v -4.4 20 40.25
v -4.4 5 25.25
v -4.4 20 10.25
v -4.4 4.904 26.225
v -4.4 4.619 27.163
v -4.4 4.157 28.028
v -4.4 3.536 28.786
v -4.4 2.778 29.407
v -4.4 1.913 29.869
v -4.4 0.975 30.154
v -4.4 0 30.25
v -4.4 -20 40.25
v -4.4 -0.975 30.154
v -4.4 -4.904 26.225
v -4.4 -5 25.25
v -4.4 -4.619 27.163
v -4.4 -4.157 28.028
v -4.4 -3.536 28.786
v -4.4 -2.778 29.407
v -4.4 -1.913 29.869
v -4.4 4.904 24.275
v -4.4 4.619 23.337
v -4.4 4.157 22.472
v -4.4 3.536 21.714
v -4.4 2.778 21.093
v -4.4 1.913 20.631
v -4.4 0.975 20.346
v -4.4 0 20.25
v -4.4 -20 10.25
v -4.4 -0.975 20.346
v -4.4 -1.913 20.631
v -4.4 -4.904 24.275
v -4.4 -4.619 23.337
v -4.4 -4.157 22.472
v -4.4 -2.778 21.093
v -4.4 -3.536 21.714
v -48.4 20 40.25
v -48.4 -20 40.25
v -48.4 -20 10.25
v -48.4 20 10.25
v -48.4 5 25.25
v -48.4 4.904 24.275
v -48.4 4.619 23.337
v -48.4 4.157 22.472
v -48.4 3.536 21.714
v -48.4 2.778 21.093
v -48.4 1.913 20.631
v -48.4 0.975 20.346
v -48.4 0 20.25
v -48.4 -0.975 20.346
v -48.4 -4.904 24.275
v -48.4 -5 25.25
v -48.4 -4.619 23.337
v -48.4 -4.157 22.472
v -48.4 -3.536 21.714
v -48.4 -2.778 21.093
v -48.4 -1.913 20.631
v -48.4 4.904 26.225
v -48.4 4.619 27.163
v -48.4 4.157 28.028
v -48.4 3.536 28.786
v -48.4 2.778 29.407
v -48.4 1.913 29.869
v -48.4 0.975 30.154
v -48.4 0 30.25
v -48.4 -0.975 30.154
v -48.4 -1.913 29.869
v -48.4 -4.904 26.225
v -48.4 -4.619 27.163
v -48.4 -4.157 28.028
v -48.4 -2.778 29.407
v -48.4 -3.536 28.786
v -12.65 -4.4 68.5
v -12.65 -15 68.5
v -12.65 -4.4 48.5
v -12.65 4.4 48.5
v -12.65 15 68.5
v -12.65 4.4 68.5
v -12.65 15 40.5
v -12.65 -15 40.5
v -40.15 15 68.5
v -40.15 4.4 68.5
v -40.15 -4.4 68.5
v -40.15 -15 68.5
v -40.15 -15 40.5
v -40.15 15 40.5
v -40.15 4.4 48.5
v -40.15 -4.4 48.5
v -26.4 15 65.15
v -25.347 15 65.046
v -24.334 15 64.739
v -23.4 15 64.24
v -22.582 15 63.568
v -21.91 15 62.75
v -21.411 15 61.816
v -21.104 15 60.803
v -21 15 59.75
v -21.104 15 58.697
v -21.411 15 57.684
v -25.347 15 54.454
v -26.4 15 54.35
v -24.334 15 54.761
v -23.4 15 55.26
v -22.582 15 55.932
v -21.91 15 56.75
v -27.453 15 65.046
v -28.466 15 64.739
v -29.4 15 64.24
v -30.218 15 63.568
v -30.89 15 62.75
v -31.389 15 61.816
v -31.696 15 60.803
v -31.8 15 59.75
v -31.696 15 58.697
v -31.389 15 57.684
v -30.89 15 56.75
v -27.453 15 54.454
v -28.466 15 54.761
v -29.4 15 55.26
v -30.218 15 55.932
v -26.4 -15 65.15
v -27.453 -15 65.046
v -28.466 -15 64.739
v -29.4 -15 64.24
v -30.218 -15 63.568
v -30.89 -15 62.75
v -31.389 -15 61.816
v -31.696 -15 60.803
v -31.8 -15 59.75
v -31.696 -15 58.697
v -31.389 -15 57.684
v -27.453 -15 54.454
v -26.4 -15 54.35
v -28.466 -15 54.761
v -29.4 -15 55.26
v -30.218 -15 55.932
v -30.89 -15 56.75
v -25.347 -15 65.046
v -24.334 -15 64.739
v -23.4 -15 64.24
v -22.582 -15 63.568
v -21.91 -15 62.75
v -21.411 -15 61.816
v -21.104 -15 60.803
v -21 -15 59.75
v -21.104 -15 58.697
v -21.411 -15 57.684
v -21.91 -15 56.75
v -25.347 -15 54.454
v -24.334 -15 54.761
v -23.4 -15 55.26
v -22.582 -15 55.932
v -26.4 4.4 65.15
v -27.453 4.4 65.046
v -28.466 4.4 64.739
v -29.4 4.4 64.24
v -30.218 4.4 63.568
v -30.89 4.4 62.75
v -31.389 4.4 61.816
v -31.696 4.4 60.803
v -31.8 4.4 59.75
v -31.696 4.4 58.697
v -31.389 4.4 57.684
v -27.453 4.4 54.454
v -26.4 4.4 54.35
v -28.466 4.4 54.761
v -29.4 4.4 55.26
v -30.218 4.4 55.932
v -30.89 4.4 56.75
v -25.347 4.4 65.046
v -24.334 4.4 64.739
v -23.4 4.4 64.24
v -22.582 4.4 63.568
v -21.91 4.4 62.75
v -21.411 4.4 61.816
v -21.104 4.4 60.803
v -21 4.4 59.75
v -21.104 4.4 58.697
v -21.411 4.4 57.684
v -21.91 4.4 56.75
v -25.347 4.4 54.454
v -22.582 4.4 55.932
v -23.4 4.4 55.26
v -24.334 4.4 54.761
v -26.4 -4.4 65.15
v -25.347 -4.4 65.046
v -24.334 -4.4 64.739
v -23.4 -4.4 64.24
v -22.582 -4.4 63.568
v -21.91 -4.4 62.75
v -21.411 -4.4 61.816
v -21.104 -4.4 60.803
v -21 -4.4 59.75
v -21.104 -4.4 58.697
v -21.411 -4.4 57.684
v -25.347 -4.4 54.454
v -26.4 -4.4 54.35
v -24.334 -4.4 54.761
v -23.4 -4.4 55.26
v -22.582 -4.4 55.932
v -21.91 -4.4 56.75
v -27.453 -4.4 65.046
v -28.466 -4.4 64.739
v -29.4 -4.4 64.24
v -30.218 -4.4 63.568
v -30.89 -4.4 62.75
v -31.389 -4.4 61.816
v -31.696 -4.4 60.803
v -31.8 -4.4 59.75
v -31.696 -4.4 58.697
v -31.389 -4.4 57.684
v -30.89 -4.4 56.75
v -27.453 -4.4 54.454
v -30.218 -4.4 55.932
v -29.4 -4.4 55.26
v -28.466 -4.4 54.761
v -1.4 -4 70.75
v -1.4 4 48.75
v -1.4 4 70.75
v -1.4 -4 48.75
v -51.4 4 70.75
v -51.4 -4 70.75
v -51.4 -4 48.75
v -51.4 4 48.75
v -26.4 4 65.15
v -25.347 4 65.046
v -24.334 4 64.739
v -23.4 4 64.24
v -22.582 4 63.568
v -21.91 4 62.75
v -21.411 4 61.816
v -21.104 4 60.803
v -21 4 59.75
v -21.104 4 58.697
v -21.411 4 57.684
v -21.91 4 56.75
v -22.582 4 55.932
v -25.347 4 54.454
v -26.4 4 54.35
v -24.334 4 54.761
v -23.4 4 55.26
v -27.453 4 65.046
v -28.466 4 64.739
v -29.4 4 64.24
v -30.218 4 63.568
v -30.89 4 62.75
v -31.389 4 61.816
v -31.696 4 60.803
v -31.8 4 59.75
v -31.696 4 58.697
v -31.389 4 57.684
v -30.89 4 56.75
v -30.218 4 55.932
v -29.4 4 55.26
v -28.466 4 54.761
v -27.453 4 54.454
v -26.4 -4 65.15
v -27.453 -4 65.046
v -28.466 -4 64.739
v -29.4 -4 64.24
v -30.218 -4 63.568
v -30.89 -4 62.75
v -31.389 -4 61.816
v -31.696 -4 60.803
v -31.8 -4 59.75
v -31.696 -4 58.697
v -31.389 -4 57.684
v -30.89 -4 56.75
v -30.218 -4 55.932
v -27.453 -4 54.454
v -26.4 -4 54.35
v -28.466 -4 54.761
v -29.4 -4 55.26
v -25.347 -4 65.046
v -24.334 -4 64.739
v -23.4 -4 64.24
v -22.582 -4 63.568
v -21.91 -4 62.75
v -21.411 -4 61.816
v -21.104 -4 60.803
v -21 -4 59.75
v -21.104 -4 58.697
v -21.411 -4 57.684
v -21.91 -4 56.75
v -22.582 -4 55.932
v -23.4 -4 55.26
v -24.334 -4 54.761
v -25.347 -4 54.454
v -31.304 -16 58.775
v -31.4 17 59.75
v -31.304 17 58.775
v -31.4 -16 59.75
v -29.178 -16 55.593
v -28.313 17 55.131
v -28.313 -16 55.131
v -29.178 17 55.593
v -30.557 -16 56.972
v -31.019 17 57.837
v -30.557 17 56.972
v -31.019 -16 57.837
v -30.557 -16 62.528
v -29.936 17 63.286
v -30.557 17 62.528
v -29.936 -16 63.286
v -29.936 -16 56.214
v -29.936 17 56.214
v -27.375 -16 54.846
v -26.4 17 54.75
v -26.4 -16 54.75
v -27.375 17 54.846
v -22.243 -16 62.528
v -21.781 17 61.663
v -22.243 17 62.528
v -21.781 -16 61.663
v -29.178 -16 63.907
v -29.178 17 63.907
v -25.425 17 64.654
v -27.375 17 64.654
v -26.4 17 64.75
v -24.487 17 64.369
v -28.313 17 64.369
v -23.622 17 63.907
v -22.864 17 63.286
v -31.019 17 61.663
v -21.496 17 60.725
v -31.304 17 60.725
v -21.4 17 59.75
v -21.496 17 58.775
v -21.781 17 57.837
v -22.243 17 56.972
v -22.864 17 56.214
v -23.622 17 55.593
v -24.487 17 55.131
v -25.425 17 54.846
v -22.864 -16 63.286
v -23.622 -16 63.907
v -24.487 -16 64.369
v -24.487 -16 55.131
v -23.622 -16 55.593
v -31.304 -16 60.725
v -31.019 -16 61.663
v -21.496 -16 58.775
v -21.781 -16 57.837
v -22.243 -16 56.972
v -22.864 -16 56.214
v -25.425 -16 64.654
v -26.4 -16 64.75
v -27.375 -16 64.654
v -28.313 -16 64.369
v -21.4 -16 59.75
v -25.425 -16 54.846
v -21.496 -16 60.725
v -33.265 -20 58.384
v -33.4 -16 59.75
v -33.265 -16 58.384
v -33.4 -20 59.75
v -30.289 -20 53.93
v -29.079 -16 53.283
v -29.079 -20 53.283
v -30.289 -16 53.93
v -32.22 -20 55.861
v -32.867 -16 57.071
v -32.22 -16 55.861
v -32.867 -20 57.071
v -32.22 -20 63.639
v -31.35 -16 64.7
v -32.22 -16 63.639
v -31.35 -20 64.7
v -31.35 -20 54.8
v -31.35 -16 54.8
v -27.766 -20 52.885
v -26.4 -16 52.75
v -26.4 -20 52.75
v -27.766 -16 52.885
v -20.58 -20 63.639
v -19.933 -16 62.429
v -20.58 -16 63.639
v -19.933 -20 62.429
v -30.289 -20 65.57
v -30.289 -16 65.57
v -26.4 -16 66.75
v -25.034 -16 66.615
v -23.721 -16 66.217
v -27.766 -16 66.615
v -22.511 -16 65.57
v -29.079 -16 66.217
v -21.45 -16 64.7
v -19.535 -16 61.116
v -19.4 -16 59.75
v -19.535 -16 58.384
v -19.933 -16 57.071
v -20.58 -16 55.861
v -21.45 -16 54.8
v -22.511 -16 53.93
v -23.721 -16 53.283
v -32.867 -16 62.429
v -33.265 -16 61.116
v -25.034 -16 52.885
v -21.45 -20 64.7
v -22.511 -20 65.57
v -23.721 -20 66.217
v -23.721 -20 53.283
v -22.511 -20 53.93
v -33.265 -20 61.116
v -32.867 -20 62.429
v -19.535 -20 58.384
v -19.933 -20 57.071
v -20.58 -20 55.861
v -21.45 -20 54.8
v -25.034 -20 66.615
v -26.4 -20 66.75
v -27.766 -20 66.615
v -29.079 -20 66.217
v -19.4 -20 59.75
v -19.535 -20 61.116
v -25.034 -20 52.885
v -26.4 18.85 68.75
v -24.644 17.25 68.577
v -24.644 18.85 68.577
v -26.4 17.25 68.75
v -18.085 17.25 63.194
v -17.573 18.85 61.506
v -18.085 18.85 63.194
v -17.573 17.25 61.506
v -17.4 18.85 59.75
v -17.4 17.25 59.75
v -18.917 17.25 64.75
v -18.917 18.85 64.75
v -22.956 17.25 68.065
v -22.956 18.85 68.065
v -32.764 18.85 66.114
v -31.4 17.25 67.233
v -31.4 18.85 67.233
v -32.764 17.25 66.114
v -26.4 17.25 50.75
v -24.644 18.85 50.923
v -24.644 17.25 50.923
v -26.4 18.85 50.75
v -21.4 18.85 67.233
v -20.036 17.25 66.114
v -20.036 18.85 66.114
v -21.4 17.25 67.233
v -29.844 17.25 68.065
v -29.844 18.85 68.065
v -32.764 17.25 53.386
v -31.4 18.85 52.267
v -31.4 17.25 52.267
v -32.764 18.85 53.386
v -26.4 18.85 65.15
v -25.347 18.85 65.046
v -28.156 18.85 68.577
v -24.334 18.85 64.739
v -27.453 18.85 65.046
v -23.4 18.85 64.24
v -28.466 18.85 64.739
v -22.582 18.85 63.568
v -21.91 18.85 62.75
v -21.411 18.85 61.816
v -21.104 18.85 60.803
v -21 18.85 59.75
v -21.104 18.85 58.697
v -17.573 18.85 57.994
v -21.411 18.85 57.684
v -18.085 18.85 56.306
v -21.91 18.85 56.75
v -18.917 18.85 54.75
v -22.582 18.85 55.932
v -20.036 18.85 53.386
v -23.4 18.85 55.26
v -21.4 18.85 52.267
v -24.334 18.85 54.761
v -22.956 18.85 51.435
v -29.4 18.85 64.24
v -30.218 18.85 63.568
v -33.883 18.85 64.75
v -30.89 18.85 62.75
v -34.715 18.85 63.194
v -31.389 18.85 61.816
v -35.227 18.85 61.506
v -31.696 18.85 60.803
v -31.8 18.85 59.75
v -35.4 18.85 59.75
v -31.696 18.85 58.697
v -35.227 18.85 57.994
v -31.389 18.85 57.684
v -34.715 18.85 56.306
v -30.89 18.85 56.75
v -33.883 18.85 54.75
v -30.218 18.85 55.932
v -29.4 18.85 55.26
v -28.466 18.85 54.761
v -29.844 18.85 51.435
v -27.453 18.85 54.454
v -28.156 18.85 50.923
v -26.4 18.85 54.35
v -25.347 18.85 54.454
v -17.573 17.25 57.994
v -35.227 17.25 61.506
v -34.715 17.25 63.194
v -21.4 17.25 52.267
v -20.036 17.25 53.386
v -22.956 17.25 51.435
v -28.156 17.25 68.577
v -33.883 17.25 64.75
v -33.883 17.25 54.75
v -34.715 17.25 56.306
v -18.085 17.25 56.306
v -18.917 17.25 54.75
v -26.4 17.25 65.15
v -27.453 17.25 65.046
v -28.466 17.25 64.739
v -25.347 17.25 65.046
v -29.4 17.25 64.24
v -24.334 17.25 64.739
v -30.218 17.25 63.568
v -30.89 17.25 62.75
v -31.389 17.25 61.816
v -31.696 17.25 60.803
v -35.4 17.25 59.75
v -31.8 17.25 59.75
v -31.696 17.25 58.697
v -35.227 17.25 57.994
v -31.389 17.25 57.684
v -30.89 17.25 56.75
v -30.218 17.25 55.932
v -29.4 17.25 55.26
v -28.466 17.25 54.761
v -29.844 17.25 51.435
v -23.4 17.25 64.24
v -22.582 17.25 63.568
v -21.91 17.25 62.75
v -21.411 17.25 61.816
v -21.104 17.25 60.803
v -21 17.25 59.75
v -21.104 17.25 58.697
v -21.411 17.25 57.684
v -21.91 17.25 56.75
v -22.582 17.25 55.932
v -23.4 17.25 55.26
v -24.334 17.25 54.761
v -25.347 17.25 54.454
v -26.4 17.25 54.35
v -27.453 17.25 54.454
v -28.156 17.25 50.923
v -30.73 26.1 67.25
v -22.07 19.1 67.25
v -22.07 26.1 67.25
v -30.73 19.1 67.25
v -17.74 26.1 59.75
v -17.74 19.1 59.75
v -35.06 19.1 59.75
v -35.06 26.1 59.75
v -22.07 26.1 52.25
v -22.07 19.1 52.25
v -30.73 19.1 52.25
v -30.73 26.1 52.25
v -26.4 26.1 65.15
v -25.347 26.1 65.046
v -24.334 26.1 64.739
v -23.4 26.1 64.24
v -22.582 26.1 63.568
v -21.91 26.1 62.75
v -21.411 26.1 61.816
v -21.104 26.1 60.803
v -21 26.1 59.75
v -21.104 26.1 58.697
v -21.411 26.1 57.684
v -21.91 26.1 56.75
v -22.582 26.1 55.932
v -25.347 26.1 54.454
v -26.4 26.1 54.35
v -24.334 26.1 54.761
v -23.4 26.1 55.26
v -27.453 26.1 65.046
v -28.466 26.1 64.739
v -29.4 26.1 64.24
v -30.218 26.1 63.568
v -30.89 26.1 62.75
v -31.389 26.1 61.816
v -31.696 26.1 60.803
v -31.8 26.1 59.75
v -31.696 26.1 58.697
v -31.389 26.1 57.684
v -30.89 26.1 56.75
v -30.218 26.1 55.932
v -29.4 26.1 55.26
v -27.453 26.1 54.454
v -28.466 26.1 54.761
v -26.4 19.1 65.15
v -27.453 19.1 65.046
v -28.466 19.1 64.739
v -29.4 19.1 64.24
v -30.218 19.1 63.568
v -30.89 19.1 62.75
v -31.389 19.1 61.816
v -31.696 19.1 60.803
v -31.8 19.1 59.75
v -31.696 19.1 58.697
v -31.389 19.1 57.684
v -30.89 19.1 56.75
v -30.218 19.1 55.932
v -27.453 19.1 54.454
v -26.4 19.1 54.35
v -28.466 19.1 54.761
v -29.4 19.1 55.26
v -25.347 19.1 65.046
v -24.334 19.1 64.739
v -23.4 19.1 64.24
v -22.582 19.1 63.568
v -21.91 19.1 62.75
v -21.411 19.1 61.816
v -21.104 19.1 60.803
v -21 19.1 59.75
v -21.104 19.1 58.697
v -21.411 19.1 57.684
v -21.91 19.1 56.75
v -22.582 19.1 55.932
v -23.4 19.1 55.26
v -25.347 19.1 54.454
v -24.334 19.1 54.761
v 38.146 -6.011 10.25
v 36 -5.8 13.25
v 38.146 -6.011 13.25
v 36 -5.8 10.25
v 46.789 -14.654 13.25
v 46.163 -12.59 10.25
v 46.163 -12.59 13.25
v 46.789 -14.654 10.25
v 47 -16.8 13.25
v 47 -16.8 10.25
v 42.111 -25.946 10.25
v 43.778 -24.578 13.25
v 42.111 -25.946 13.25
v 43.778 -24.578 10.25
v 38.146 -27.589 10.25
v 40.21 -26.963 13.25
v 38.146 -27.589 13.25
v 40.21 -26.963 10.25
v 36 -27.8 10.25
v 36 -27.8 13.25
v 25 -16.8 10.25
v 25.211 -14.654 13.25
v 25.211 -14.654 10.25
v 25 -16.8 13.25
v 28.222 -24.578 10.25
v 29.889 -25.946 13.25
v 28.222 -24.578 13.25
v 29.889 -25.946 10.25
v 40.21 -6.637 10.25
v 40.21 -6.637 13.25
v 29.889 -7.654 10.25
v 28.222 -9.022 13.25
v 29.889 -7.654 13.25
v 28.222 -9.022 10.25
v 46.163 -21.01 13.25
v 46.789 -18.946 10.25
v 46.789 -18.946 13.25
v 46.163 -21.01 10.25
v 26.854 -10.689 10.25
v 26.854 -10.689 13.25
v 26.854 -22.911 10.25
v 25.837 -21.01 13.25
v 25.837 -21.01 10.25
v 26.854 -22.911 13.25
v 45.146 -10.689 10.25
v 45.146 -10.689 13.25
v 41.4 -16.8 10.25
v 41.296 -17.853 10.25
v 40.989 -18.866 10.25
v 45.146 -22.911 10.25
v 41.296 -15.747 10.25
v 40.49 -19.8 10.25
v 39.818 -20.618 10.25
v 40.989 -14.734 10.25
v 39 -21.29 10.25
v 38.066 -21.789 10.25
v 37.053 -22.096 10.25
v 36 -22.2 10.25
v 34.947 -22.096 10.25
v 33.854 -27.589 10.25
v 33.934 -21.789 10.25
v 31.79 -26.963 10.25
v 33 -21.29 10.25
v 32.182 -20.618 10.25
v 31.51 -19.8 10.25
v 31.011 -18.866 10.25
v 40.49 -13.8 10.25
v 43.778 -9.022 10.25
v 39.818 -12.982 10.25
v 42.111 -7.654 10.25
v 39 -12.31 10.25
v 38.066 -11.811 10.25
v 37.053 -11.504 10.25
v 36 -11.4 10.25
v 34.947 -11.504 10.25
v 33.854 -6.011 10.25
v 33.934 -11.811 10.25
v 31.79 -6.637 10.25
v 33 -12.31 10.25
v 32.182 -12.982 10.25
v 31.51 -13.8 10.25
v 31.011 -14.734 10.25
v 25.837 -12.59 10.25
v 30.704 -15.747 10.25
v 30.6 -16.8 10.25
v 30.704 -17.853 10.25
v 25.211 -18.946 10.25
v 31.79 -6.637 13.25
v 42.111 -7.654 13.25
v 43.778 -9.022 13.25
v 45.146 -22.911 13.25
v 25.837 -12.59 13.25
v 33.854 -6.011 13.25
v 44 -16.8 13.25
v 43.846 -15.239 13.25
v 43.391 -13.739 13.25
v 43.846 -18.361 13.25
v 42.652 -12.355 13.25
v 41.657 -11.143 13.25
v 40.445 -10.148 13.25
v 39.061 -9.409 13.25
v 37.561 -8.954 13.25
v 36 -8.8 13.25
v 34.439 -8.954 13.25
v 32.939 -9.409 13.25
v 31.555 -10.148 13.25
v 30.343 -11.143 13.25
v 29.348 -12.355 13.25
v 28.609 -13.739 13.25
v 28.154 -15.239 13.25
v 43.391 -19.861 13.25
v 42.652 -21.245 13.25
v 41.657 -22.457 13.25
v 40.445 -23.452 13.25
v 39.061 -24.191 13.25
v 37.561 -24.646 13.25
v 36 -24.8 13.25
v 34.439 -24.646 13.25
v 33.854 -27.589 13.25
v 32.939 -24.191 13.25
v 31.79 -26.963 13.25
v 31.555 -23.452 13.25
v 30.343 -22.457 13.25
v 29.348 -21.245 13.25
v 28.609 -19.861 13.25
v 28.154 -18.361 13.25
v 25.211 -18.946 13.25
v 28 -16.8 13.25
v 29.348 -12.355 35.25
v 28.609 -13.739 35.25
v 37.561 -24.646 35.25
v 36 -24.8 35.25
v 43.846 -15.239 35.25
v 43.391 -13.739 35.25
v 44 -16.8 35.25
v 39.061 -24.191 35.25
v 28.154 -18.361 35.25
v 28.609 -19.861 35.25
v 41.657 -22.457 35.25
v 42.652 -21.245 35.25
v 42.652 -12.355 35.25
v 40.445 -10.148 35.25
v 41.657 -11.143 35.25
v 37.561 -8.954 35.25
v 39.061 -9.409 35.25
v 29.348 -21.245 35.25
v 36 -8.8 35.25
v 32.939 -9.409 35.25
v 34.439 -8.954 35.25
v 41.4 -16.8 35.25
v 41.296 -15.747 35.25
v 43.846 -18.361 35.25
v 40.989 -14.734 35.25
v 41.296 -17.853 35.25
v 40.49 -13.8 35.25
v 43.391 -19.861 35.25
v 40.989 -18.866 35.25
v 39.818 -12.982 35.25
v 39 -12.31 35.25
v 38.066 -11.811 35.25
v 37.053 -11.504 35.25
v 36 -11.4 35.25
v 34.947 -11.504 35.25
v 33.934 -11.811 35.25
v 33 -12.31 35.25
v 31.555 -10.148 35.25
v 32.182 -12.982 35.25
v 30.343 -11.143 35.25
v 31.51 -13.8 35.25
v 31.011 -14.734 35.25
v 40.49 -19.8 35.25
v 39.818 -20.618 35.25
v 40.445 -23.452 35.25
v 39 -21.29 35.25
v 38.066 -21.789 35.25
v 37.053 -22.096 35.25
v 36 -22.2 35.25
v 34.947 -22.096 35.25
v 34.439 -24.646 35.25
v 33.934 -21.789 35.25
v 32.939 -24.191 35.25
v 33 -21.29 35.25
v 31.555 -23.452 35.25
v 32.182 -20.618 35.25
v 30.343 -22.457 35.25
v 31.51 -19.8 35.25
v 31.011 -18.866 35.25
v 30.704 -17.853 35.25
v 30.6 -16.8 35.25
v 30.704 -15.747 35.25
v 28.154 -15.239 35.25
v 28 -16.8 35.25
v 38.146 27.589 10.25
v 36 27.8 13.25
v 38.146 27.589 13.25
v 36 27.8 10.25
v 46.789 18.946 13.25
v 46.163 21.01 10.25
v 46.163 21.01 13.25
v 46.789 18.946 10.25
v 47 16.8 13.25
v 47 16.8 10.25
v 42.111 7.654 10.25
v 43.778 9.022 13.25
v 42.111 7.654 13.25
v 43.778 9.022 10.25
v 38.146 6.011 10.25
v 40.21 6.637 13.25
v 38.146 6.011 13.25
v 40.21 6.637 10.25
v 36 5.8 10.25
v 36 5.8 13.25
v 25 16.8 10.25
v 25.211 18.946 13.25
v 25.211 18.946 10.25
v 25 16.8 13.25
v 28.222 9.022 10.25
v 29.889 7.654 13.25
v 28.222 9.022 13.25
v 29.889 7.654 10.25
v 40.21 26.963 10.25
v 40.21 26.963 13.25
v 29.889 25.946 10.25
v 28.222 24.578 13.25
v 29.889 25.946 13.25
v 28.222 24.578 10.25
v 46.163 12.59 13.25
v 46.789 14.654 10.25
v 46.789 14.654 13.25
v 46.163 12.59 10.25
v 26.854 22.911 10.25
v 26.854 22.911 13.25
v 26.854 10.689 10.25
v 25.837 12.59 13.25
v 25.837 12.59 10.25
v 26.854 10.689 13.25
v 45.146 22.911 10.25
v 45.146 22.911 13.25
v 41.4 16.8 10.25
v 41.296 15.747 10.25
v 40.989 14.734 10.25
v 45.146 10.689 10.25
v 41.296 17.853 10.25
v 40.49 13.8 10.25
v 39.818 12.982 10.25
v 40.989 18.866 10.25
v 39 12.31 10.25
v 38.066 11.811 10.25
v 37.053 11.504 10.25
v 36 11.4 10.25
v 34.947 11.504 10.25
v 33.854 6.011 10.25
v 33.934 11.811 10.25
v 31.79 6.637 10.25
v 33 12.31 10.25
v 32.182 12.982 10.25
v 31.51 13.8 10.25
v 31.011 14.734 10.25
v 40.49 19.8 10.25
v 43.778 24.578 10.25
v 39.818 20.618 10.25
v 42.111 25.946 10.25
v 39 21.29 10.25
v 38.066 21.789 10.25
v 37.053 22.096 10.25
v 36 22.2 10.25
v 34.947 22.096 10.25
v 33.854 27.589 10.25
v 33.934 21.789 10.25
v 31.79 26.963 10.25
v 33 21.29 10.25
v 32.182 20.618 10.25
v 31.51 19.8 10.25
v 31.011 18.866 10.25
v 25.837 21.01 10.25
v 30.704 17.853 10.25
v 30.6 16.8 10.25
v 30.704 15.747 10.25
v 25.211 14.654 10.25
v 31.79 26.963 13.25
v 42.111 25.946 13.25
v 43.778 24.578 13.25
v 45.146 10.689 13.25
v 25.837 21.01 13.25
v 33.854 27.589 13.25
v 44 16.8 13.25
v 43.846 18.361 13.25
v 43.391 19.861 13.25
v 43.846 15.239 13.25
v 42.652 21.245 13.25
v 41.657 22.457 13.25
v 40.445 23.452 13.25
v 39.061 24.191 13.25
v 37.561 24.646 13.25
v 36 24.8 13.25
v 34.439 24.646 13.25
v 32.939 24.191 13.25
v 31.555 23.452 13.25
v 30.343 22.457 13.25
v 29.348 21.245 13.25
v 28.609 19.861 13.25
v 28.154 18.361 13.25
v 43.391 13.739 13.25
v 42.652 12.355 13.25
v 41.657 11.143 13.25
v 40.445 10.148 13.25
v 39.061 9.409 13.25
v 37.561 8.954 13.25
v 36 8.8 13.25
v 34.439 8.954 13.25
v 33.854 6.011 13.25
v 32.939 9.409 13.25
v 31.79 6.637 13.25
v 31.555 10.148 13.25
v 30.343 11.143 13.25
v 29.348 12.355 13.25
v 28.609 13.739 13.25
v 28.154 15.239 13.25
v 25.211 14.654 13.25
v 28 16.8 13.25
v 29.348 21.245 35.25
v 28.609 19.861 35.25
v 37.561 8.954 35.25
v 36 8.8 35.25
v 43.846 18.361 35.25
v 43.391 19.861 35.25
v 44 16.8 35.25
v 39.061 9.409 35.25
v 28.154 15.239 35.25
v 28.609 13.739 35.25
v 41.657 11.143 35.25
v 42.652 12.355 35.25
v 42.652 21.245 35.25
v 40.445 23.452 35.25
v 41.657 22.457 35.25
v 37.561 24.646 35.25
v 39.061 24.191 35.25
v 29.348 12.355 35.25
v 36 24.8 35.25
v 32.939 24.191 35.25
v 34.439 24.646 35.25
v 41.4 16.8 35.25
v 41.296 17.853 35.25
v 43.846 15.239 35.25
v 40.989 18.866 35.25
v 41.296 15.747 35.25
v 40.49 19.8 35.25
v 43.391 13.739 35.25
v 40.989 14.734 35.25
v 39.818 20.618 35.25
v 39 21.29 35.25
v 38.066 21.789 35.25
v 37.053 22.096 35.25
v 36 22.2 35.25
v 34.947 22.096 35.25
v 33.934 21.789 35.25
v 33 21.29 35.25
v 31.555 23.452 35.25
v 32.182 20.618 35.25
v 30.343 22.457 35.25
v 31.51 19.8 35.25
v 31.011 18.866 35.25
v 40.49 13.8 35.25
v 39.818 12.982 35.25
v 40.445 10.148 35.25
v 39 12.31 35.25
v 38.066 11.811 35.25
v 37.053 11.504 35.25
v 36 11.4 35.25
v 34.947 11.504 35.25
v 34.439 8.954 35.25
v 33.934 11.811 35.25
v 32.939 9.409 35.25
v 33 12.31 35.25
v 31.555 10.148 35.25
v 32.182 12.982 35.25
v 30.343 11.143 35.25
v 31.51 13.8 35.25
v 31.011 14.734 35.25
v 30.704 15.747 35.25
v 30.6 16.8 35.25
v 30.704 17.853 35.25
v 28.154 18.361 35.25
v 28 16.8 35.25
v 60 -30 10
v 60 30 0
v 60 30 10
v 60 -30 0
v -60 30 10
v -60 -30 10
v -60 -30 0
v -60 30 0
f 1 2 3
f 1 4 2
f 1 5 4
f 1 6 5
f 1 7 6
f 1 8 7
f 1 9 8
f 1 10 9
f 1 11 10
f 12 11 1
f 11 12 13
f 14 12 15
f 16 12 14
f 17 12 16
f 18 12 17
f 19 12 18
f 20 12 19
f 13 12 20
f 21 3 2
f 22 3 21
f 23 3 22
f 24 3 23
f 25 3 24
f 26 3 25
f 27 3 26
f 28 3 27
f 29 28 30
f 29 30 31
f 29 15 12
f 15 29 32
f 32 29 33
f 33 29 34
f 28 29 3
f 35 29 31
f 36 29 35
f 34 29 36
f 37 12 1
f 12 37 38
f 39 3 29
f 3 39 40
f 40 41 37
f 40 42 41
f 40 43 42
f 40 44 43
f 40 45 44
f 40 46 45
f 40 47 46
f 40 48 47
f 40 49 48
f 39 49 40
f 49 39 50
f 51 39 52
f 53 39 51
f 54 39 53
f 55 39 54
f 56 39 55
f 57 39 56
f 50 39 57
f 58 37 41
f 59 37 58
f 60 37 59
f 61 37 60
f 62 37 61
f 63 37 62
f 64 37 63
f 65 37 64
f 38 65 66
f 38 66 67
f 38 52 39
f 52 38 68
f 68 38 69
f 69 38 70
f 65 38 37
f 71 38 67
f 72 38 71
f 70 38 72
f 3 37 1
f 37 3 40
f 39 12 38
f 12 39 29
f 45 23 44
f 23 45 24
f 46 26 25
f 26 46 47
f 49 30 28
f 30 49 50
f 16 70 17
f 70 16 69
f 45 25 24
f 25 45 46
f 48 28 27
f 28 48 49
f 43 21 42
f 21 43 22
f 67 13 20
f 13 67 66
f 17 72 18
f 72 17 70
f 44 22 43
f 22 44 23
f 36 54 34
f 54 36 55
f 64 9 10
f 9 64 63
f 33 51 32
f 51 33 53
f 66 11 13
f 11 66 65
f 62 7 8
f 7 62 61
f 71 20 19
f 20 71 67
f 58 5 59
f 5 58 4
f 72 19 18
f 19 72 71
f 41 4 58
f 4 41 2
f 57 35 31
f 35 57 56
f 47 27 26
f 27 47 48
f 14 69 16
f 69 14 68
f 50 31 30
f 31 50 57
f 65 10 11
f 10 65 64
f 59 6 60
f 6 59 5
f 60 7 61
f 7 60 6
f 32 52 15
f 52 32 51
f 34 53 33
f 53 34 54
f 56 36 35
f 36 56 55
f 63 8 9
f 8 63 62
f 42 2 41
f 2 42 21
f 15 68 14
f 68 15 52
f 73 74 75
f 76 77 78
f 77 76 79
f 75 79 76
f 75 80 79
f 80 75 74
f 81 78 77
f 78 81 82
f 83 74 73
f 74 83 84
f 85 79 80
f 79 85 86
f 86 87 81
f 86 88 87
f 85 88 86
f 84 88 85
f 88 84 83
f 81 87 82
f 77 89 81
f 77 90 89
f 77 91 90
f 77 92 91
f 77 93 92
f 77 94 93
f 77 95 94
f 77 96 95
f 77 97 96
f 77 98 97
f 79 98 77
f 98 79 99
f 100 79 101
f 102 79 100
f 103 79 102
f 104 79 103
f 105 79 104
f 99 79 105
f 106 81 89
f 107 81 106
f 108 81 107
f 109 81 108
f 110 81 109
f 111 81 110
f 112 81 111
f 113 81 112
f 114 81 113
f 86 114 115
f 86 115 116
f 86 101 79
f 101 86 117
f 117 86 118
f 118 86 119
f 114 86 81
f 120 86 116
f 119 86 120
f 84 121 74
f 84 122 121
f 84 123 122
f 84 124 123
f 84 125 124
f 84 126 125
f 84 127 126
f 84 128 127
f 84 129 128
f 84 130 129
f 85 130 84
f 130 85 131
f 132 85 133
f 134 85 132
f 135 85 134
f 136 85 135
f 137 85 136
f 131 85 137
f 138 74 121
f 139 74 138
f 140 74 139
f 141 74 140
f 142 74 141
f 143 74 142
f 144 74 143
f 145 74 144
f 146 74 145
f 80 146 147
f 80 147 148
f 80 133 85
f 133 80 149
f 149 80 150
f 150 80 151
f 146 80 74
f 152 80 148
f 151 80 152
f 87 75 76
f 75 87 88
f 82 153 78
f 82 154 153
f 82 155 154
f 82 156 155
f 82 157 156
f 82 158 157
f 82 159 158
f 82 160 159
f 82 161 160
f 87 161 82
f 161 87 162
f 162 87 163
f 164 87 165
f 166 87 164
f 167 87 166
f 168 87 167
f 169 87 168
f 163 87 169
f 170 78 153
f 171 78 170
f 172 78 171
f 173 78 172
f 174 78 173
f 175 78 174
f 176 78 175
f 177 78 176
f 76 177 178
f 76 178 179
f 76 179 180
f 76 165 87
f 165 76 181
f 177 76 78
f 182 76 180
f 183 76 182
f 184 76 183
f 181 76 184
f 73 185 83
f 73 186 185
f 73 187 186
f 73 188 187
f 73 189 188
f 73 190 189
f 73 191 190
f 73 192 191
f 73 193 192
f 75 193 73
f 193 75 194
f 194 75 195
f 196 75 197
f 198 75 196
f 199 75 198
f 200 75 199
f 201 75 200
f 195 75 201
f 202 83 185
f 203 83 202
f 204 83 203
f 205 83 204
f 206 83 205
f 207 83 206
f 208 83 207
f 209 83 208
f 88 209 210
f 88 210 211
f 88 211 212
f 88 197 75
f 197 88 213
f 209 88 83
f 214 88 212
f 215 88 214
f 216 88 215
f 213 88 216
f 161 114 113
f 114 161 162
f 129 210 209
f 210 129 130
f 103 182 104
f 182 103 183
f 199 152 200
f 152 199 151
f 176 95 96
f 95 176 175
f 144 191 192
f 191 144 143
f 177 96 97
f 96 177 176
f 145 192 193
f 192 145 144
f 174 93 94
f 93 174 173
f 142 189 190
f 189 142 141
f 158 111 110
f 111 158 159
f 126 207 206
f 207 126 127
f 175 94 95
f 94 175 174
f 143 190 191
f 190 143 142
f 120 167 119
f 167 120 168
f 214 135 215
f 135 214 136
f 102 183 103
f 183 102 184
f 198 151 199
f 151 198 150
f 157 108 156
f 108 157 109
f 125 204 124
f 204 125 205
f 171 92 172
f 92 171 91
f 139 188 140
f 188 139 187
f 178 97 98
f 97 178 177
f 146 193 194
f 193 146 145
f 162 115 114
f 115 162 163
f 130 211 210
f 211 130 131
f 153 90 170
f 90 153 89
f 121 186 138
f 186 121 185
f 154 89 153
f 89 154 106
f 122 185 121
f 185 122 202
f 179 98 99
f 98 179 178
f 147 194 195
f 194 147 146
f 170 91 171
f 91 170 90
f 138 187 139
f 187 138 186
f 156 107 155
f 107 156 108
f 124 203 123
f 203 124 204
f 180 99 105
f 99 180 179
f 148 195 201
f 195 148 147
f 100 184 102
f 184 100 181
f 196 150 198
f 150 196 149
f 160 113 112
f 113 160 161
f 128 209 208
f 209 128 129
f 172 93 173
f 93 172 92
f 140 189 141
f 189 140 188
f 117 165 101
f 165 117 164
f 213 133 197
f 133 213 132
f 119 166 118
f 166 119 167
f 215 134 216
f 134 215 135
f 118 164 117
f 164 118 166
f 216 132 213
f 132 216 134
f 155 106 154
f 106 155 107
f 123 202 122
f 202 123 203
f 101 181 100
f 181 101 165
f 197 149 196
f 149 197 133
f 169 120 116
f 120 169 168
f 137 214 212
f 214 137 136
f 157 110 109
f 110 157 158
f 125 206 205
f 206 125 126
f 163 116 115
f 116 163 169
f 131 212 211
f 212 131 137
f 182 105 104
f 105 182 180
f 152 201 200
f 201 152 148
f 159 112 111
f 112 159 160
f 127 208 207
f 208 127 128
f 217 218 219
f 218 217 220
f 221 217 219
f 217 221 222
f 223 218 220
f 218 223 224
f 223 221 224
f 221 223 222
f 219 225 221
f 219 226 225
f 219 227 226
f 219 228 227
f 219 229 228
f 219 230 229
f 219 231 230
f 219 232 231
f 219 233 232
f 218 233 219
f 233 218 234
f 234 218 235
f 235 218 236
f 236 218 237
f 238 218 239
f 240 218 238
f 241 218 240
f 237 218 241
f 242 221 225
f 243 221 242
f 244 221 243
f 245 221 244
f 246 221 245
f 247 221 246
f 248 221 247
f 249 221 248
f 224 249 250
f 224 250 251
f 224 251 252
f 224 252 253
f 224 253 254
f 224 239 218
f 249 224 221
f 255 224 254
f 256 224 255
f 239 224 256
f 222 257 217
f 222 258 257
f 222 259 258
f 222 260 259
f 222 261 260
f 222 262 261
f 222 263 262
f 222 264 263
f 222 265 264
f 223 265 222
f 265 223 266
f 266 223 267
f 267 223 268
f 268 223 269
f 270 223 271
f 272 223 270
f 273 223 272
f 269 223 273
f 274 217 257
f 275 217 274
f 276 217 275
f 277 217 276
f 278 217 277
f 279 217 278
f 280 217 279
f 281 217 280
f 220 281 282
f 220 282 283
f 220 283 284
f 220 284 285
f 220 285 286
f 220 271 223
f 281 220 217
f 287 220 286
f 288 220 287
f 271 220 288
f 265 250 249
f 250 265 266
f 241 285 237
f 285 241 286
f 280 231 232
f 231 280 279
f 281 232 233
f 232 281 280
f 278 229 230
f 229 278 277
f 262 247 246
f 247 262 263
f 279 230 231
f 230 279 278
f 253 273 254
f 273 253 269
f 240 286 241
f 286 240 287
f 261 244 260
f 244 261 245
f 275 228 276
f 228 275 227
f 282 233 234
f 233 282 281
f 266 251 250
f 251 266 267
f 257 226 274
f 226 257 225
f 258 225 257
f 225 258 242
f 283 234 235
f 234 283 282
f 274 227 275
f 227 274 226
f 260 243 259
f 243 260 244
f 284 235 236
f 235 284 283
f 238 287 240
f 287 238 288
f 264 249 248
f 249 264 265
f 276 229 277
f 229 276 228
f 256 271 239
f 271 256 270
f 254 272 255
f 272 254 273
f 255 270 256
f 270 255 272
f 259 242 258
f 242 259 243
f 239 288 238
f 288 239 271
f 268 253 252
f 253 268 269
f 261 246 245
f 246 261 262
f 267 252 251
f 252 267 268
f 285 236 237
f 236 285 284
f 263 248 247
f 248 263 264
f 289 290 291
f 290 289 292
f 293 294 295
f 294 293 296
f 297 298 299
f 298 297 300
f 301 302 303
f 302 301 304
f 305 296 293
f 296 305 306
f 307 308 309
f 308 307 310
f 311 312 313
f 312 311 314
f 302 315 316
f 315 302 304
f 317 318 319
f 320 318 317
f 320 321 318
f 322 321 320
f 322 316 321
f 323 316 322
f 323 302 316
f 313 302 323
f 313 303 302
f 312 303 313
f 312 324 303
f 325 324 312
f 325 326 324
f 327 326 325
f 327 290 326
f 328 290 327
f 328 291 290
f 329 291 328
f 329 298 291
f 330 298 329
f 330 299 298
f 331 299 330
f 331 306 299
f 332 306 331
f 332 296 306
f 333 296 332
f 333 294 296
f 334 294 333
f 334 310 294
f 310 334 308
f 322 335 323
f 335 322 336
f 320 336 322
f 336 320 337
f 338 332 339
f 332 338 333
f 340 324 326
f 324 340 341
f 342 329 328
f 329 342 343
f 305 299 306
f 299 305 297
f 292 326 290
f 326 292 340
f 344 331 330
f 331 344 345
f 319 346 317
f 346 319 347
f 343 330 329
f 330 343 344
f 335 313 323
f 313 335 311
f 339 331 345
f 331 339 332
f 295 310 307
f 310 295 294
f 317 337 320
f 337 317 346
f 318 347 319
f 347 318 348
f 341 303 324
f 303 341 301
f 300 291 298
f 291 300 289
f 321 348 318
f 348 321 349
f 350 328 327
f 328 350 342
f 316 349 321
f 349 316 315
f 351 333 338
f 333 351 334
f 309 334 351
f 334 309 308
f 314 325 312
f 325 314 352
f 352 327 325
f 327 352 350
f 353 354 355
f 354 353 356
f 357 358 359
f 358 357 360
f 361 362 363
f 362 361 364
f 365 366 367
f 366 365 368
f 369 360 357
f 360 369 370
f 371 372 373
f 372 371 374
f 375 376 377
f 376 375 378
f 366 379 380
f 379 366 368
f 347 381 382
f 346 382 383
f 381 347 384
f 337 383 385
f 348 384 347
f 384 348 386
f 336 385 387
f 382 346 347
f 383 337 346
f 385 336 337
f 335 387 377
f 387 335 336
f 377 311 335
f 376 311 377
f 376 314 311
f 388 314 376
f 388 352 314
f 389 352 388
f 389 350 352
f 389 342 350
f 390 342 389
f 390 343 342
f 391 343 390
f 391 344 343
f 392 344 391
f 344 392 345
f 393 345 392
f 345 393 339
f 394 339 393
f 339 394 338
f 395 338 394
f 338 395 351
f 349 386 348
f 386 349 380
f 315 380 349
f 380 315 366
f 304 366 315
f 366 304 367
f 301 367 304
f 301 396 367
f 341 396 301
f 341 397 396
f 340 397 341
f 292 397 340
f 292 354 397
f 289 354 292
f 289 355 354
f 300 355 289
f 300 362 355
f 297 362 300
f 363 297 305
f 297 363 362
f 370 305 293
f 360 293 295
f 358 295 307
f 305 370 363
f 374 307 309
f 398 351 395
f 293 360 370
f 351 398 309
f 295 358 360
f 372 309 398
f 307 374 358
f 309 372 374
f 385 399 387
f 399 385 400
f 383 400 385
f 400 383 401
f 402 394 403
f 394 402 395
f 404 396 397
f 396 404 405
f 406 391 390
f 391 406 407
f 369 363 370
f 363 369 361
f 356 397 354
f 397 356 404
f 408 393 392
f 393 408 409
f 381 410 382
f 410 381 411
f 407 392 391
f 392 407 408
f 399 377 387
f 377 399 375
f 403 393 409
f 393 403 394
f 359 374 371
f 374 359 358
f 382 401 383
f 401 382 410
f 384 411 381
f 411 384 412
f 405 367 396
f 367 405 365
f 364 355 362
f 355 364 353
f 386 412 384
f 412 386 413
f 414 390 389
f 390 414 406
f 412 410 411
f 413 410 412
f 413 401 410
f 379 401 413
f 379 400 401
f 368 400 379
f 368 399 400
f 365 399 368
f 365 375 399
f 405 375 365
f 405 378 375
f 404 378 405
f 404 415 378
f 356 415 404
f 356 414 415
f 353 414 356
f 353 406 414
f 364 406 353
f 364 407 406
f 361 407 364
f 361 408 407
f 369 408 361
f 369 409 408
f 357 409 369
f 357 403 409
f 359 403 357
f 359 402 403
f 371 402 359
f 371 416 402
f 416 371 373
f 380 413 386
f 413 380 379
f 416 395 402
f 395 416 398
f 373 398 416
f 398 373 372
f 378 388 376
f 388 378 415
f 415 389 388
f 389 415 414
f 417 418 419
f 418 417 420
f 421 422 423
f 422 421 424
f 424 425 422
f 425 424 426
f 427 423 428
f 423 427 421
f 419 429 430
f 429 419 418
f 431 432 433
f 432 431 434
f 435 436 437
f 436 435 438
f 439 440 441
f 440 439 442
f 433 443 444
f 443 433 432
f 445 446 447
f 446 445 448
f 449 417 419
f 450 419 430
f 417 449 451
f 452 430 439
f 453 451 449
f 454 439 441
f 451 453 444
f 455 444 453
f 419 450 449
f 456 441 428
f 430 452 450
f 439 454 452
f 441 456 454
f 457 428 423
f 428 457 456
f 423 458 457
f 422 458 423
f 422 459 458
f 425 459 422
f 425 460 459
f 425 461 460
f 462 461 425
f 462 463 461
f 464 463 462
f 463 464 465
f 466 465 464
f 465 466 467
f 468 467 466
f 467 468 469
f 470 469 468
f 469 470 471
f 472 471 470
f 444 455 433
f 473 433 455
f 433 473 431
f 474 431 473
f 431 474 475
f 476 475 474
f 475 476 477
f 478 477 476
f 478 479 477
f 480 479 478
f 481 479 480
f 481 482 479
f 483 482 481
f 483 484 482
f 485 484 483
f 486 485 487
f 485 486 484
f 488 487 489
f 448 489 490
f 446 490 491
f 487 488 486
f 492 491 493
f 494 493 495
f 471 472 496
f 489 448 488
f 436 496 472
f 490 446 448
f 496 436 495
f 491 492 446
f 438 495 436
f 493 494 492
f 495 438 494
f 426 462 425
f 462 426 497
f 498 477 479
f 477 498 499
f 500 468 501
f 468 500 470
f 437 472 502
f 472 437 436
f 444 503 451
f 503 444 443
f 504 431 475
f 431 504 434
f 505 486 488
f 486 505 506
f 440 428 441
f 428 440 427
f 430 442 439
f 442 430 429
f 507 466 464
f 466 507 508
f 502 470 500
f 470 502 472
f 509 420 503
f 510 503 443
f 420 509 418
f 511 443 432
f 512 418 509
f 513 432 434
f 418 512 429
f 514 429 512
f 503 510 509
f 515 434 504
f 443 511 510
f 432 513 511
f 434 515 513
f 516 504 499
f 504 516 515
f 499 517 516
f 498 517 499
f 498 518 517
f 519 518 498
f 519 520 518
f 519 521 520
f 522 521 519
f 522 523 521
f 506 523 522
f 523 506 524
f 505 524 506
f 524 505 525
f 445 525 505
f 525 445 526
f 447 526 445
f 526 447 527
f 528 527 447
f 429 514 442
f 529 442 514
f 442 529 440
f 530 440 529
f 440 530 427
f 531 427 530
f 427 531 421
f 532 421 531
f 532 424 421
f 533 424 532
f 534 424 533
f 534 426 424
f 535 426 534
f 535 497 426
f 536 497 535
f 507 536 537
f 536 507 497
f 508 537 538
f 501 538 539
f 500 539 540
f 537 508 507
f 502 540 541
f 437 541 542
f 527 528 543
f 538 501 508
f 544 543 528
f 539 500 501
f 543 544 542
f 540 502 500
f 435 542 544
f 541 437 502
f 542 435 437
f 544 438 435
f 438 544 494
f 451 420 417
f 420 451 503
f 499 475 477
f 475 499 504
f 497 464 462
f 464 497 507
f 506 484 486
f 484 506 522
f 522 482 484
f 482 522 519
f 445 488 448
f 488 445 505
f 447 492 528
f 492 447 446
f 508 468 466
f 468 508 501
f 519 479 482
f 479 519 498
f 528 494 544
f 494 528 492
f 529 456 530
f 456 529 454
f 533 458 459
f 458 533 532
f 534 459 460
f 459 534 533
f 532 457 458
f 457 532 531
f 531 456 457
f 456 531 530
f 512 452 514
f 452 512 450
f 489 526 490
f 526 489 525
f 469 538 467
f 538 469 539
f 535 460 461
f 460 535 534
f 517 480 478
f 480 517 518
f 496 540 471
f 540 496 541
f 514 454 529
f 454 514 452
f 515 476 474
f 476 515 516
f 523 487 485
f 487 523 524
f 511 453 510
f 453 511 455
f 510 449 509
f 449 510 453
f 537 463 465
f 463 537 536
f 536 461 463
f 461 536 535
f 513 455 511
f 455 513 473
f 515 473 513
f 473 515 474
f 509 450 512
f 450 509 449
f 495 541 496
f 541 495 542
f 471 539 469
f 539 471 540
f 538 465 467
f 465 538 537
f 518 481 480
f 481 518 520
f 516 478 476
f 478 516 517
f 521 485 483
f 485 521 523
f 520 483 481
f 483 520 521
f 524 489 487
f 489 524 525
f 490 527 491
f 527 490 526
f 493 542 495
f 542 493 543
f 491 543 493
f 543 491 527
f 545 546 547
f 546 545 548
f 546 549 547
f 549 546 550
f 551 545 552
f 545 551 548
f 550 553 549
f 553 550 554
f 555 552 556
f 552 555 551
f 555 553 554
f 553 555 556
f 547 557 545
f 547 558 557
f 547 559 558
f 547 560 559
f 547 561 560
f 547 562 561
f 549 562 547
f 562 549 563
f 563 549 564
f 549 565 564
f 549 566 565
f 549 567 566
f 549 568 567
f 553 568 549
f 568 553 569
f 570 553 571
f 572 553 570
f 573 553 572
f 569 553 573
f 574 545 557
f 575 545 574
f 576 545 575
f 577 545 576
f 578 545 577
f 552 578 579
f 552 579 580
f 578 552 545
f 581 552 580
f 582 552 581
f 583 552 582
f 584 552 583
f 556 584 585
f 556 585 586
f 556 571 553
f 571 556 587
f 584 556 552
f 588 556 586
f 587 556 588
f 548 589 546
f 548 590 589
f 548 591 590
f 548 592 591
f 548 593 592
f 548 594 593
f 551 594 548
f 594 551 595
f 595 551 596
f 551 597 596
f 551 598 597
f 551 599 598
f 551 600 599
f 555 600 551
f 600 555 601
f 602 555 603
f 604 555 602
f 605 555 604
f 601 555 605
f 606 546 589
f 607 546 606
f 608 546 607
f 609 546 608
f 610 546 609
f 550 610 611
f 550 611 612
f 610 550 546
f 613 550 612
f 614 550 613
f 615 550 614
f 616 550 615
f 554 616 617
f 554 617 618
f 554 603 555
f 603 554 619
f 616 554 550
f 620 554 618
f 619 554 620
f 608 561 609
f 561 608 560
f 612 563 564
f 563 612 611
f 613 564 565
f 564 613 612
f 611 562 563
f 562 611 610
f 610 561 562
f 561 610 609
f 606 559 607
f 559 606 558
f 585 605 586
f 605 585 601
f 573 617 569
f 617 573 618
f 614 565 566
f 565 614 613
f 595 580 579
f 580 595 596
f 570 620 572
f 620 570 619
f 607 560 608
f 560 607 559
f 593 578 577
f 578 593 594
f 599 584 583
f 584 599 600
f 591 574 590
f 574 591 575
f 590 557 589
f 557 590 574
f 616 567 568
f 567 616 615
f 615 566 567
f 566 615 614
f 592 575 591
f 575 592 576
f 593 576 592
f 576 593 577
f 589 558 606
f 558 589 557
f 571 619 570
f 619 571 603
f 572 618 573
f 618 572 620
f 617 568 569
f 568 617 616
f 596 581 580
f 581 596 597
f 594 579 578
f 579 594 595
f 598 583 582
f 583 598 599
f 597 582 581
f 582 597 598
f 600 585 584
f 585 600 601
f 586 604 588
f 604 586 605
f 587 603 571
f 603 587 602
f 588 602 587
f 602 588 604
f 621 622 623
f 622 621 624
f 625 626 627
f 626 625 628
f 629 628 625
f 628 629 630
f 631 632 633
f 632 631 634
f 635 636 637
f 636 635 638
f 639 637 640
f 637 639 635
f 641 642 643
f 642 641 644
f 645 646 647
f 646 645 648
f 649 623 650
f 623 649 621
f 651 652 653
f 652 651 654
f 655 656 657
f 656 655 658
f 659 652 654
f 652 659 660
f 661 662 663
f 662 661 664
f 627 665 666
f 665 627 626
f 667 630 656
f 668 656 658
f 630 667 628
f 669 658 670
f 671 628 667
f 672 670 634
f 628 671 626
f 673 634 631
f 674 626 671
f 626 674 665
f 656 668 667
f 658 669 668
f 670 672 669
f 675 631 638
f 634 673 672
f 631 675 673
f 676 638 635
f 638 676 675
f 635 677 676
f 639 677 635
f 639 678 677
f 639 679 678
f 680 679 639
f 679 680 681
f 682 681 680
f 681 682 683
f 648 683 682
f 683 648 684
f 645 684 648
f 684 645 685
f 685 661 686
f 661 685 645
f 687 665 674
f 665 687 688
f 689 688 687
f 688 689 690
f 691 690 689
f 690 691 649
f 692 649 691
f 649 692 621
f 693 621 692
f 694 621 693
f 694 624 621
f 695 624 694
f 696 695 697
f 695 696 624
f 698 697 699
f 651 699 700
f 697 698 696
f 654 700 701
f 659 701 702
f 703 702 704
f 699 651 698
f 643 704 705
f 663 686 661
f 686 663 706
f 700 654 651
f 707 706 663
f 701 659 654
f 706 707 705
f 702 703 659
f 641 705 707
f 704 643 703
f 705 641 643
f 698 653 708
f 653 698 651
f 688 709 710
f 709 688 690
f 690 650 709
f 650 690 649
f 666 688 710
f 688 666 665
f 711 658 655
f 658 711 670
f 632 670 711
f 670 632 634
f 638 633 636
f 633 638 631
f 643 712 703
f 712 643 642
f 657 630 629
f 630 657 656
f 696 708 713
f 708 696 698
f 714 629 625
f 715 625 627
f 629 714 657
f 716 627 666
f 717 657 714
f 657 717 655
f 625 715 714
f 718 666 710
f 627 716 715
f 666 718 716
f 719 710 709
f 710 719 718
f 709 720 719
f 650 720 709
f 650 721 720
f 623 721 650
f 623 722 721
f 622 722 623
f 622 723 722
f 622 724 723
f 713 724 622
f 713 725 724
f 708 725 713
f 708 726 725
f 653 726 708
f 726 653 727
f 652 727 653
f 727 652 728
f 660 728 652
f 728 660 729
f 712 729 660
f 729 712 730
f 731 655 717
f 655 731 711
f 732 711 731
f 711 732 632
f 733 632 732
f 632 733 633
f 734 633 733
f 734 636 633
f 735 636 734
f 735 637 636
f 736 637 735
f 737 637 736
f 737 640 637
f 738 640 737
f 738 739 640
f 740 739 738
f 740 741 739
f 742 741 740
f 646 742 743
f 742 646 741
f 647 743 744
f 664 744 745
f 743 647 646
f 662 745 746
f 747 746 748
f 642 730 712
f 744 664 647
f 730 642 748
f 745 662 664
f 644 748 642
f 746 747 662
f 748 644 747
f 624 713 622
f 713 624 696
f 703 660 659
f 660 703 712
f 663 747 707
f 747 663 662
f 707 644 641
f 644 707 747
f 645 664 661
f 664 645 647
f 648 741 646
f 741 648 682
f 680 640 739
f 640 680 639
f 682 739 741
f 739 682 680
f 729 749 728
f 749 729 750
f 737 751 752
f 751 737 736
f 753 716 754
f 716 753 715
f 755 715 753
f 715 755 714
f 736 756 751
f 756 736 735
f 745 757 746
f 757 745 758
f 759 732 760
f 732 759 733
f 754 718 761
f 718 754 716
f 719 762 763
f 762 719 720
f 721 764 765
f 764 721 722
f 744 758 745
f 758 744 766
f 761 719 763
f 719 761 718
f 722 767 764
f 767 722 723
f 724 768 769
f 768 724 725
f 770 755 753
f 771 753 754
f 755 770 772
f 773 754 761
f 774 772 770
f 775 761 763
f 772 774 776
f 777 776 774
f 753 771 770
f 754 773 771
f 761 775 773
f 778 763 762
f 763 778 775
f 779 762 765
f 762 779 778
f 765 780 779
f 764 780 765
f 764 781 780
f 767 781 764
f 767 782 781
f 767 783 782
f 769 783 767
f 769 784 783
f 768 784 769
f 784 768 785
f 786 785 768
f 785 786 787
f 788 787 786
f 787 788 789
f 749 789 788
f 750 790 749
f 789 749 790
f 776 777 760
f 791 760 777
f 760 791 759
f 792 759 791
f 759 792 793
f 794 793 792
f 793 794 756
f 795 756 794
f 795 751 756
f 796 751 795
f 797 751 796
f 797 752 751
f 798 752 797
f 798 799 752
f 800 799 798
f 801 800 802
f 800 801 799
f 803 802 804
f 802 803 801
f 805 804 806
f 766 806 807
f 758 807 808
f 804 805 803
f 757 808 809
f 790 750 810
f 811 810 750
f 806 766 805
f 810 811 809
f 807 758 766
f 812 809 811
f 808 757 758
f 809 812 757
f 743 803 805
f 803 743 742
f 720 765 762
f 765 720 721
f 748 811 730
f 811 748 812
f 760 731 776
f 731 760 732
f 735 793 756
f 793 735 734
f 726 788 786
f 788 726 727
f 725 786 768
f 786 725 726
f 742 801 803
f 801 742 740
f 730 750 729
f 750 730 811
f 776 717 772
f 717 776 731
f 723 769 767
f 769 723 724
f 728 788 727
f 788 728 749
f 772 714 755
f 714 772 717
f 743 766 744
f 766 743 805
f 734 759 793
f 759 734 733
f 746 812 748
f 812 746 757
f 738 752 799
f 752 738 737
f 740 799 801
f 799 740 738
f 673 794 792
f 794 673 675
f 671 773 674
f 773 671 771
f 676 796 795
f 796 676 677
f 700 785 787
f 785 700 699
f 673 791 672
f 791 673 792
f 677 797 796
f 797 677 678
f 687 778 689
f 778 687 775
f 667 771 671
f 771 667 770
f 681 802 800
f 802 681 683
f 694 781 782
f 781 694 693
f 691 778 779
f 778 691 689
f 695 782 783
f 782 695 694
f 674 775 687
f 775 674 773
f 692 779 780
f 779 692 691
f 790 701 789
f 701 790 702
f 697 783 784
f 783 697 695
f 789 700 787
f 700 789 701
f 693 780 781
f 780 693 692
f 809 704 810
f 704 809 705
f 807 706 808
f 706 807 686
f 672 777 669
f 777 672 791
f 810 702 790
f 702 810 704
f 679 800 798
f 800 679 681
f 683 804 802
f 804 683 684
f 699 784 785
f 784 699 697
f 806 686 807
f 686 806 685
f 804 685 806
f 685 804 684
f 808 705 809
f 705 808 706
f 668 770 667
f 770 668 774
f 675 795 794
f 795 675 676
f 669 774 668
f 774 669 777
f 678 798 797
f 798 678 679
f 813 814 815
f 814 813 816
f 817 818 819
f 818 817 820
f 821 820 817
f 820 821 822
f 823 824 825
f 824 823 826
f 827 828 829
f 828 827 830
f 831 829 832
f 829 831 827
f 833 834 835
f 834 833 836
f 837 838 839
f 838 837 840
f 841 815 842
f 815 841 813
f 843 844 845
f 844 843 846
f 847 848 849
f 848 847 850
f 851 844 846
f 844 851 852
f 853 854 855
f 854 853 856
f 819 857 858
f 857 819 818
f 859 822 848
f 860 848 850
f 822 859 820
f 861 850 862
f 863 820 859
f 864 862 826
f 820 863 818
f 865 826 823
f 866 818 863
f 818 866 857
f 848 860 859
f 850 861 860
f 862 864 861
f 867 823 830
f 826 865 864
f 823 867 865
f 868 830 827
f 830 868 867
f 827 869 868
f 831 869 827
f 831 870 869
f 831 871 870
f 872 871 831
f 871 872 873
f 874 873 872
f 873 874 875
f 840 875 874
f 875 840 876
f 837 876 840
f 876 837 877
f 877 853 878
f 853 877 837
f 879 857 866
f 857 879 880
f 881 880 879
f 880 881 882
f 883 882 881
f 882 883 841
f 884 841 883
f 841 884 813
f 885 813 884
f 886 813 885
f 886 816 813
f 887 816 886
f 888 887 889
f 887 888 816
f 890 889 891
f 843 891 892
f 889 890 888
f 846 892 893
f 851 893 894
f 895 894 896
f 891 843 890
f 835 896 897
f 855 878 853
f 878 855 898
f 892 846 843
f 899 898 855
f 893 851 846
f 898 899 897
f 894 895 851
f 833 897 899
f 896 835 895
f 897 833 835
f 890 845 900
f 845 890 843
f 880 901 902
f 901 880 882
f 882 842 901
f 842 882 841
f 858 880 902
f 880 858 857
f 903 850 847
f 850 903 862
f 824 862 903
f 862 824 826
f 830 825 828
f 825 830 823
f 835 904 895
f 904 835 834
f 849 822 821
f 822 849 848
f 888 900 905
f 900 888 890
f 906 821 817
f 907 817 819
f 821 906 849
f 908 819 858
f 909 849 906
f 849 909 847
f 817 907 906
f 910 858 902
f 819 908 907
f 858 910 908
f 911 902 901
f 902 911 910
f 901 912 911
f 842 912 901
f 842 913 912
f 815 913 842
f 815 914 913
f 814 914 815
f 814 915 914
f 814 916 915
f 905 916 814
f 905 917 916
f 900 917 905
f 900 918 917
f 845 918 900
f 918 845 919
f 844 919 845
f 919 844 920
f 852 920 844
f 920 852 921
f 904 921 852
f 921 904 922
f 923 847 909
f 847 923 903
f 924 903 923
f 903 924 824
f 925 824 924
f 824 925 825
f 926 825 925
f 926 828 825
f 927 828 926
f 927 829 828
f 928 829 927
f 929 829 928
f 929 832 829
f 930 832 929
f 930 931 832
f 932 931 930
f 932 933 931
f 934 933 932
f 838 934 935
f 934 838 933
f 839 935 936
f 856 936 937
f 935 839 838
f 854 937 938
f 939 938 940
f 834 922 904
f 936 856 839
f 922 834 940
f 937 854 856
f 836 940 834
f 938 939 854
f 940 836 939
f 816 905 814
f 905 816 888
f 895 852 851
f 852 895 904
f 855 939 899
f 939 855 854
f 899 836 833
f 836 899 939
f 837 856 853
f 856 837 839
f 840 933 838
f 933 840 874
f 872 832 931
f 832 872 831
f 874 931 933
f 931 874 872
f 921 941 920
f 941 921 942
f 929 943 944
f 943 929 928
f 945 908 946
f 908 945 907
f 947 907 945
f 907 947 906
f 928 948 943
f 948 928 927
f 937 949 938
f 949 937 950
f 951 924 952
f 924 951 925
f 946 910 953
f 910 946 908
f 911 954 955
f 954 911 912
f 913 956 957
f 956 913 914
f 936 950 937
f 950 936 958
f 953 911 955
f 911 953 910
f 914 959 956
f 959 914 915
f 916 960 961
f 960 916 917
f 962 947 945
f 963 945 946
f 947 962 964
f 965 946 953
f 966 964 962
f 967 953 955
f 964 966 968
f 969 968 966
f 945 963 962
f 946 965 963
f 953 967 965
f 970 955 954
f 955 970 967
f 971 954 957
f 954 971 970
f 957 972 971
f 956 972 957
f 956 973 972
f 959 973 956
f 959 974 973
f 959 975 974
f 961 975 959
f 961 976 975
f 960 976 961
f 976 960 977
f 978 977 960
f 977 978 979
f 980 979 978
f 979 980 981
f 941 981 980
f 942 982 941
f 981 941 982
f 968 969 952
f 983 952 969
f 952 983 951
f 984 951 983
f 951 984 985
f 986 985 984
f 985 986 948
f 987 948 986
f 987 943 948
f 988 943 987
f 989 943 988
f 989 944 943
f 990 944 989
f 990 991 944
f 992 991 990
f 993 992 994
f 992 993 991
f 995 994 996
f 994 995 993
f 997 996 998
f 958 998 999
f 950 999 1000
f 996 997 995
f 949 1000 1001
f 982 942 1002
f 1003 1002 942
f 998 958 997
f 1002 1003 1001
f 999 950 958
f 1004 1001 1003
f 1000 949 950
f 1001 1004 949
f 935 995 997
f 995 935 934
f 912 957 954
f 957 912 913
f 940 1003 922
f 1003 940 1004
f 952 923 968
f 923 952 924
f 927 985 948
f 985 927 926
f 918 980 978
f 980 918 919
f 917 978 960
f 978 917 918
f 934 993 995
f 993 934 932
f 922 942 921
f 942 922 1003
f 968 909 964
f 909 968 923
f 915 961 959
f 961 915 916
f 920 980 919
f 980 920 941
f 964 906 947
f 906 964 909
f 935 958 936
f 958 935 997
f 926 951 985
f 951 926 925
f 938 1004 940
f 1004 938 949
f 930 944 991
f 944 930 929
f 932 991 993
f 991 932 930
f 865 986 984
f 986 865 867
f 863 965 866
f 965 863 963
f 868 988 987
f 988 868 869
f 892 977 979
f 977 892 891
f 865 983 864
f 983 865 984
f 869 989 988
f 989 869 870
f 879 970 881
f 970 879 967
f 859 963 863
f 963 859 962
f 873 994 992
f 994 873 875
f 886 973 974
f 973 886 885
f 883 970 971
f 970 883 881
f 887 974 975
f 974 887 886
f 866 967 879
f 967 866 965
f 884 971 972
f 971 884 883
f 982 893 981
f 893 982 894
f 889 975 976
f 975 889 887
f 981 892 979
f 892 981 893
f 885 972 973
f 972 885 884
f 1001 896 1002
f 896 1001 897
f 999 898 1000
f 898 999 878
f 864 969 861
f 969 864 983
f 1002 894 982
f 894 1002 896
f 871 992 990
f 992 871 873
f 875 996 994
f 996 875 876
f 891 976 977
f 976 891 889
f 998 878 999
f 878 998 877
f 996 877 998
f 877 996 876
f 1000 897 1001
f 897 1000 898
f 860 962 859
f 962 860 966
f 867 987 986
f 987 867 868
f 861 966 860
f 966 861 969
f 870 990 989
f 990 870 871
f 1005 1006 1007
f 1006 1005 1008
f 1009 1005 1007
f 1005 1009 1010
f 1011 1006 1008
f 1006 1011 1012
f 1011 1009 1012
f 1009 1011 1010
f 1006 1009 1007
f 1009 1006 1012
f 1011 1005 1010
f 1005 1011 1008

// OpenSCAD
$fn = 32;

// ------------------------------------------------------------------------
// Indexing jig: plate 120 x 60 mm, pin d10
// Every part is its own module, assembly() places every instance.
// ------------------------------------------------------------------------

// --- part 1 ---
module jig_plate() {
  difference() {
    translate([-60, -30, 0]) cube([120, 60, 10]);
  }
}

// --- part 2 ---
module locator_block() {
  difference() {
    translate([-22, -20, 0]) cube([44, 40, 30]);
    translate([0, 0, 15]) rotate([0, 90, 0]) cylinder(h = 46, d = 10, center = true);
  }
}

// --- part 3 ---
module index_fork() {
  difference() {
    translate([-13.75, -15, 0]) cube([27.5, 30, 28]);
    translate([-14.75, -4.4, 8]) cube([29.5, 8.8, 21]);
    translate([0, 0, 19.25]) rotate([90, 0, 0]) cylinder(h = 32, d = 10.8, center = true);
  }
}

// --- part 4 ---
module index_arm() {
  difference() {
    translate([-25, -4, 0]) cube([50, 8, 22]);
    translate([0, 0, 11]) rotate([90, 0, 0]) cylinder(h = 10, d = 10.8, center = true);
  }
}

// --- part 5 ---
module index_pin() {
  rotate([0, 90, 0]) cylinder(h = 34, d = 10, center = true);
  translate([-20, 0, 0]) rotate([0, 90, 0]) cylinder(h = 4, d = 14);
}

// --- part 6 ---
module pin_washer() {
  difference() {
      translate([0, 0, 0]) cylinder(h = 1.6, d = 18);
      translate([0, 0, -1]) cylinder(h = 3.6, d = 10.8);
    }
}

// --- part 7 ---
module lock_nut() {
  difference() {
    linear_extrude(height = 7) polygon(points = [[8.66, 0], [4.33, 7.5], [-4.33, 7.5], [-8.66, 0], [-4.33, -7.5], [4.33, -7.5]]);
    translate([0, 0, -1]) cylinder(h = 9, d = 10.8);
  }
}

// --- part 8 ---
module guide_bush_a() {
  difference() {
    union() {
      cylinder(h = 3, d = 22);
      translate([0, 0, 3]) cylinder(h = 22, d = 16);
    }
    translate([0, 0, -1]) cylinder(h = 27, d = 10.8);
  }
}

// --- part 9 ---
module guide_bush_b() {
  difference() {
    union() {
      cylinder(h = 3, d = 22);
      translate([0, 0, 3]) cylinder(h = 22, d = 16);
    }
    translate([0, 0, -1]) cylinder(h = 27, d = 10.8);
  }
}

// --- assembly ---
module assembly() {
  color([0.80, 0.24, 0.20]) translate([0, 0, 0]) rotate([0, 0, 0]) jig_plate();
  color([0.20, 0.45, 0.75]) translate([-26.4, 0, 10.25]) rotate([0, 0, 0]) locator_block();
  color([0.25, 0.62, 0.32]) translate([-26.4, 0, 40.5]) rotate([0, 0, 0]) index_fork();
  color([0.92, 0.70, 0.18]) translate([-26.4, 0, 48.75]) rotate([0, 0, 0]) index_arm();
  color([0.58, 0.35, 0.70]) translate([-26.4, 0, 59.75]) rotate([0, 0, 90]) index_pin();
  color([0.16, 0.66, 0.66]) translate([-26.4, 18.85, 59.75]) rotate([90, 0, 0]) pin_washer();
  color([0.85, 0.48, 0.18]) translate([-26.4, 26.1, 59.75]) rotate([90, 0, 0]) lock_nut();
  color([0.55, 0.60, 0.65]) translate([36, -16.8, 10.25]) rotate([0, 0, 0]) guide_bush_a();
  color([0.75, 0.30, 0.55]) translate([36, 16.8, 10.25]) rotate([0, 0, 0]) guide_bush_b();
}

assembly();
